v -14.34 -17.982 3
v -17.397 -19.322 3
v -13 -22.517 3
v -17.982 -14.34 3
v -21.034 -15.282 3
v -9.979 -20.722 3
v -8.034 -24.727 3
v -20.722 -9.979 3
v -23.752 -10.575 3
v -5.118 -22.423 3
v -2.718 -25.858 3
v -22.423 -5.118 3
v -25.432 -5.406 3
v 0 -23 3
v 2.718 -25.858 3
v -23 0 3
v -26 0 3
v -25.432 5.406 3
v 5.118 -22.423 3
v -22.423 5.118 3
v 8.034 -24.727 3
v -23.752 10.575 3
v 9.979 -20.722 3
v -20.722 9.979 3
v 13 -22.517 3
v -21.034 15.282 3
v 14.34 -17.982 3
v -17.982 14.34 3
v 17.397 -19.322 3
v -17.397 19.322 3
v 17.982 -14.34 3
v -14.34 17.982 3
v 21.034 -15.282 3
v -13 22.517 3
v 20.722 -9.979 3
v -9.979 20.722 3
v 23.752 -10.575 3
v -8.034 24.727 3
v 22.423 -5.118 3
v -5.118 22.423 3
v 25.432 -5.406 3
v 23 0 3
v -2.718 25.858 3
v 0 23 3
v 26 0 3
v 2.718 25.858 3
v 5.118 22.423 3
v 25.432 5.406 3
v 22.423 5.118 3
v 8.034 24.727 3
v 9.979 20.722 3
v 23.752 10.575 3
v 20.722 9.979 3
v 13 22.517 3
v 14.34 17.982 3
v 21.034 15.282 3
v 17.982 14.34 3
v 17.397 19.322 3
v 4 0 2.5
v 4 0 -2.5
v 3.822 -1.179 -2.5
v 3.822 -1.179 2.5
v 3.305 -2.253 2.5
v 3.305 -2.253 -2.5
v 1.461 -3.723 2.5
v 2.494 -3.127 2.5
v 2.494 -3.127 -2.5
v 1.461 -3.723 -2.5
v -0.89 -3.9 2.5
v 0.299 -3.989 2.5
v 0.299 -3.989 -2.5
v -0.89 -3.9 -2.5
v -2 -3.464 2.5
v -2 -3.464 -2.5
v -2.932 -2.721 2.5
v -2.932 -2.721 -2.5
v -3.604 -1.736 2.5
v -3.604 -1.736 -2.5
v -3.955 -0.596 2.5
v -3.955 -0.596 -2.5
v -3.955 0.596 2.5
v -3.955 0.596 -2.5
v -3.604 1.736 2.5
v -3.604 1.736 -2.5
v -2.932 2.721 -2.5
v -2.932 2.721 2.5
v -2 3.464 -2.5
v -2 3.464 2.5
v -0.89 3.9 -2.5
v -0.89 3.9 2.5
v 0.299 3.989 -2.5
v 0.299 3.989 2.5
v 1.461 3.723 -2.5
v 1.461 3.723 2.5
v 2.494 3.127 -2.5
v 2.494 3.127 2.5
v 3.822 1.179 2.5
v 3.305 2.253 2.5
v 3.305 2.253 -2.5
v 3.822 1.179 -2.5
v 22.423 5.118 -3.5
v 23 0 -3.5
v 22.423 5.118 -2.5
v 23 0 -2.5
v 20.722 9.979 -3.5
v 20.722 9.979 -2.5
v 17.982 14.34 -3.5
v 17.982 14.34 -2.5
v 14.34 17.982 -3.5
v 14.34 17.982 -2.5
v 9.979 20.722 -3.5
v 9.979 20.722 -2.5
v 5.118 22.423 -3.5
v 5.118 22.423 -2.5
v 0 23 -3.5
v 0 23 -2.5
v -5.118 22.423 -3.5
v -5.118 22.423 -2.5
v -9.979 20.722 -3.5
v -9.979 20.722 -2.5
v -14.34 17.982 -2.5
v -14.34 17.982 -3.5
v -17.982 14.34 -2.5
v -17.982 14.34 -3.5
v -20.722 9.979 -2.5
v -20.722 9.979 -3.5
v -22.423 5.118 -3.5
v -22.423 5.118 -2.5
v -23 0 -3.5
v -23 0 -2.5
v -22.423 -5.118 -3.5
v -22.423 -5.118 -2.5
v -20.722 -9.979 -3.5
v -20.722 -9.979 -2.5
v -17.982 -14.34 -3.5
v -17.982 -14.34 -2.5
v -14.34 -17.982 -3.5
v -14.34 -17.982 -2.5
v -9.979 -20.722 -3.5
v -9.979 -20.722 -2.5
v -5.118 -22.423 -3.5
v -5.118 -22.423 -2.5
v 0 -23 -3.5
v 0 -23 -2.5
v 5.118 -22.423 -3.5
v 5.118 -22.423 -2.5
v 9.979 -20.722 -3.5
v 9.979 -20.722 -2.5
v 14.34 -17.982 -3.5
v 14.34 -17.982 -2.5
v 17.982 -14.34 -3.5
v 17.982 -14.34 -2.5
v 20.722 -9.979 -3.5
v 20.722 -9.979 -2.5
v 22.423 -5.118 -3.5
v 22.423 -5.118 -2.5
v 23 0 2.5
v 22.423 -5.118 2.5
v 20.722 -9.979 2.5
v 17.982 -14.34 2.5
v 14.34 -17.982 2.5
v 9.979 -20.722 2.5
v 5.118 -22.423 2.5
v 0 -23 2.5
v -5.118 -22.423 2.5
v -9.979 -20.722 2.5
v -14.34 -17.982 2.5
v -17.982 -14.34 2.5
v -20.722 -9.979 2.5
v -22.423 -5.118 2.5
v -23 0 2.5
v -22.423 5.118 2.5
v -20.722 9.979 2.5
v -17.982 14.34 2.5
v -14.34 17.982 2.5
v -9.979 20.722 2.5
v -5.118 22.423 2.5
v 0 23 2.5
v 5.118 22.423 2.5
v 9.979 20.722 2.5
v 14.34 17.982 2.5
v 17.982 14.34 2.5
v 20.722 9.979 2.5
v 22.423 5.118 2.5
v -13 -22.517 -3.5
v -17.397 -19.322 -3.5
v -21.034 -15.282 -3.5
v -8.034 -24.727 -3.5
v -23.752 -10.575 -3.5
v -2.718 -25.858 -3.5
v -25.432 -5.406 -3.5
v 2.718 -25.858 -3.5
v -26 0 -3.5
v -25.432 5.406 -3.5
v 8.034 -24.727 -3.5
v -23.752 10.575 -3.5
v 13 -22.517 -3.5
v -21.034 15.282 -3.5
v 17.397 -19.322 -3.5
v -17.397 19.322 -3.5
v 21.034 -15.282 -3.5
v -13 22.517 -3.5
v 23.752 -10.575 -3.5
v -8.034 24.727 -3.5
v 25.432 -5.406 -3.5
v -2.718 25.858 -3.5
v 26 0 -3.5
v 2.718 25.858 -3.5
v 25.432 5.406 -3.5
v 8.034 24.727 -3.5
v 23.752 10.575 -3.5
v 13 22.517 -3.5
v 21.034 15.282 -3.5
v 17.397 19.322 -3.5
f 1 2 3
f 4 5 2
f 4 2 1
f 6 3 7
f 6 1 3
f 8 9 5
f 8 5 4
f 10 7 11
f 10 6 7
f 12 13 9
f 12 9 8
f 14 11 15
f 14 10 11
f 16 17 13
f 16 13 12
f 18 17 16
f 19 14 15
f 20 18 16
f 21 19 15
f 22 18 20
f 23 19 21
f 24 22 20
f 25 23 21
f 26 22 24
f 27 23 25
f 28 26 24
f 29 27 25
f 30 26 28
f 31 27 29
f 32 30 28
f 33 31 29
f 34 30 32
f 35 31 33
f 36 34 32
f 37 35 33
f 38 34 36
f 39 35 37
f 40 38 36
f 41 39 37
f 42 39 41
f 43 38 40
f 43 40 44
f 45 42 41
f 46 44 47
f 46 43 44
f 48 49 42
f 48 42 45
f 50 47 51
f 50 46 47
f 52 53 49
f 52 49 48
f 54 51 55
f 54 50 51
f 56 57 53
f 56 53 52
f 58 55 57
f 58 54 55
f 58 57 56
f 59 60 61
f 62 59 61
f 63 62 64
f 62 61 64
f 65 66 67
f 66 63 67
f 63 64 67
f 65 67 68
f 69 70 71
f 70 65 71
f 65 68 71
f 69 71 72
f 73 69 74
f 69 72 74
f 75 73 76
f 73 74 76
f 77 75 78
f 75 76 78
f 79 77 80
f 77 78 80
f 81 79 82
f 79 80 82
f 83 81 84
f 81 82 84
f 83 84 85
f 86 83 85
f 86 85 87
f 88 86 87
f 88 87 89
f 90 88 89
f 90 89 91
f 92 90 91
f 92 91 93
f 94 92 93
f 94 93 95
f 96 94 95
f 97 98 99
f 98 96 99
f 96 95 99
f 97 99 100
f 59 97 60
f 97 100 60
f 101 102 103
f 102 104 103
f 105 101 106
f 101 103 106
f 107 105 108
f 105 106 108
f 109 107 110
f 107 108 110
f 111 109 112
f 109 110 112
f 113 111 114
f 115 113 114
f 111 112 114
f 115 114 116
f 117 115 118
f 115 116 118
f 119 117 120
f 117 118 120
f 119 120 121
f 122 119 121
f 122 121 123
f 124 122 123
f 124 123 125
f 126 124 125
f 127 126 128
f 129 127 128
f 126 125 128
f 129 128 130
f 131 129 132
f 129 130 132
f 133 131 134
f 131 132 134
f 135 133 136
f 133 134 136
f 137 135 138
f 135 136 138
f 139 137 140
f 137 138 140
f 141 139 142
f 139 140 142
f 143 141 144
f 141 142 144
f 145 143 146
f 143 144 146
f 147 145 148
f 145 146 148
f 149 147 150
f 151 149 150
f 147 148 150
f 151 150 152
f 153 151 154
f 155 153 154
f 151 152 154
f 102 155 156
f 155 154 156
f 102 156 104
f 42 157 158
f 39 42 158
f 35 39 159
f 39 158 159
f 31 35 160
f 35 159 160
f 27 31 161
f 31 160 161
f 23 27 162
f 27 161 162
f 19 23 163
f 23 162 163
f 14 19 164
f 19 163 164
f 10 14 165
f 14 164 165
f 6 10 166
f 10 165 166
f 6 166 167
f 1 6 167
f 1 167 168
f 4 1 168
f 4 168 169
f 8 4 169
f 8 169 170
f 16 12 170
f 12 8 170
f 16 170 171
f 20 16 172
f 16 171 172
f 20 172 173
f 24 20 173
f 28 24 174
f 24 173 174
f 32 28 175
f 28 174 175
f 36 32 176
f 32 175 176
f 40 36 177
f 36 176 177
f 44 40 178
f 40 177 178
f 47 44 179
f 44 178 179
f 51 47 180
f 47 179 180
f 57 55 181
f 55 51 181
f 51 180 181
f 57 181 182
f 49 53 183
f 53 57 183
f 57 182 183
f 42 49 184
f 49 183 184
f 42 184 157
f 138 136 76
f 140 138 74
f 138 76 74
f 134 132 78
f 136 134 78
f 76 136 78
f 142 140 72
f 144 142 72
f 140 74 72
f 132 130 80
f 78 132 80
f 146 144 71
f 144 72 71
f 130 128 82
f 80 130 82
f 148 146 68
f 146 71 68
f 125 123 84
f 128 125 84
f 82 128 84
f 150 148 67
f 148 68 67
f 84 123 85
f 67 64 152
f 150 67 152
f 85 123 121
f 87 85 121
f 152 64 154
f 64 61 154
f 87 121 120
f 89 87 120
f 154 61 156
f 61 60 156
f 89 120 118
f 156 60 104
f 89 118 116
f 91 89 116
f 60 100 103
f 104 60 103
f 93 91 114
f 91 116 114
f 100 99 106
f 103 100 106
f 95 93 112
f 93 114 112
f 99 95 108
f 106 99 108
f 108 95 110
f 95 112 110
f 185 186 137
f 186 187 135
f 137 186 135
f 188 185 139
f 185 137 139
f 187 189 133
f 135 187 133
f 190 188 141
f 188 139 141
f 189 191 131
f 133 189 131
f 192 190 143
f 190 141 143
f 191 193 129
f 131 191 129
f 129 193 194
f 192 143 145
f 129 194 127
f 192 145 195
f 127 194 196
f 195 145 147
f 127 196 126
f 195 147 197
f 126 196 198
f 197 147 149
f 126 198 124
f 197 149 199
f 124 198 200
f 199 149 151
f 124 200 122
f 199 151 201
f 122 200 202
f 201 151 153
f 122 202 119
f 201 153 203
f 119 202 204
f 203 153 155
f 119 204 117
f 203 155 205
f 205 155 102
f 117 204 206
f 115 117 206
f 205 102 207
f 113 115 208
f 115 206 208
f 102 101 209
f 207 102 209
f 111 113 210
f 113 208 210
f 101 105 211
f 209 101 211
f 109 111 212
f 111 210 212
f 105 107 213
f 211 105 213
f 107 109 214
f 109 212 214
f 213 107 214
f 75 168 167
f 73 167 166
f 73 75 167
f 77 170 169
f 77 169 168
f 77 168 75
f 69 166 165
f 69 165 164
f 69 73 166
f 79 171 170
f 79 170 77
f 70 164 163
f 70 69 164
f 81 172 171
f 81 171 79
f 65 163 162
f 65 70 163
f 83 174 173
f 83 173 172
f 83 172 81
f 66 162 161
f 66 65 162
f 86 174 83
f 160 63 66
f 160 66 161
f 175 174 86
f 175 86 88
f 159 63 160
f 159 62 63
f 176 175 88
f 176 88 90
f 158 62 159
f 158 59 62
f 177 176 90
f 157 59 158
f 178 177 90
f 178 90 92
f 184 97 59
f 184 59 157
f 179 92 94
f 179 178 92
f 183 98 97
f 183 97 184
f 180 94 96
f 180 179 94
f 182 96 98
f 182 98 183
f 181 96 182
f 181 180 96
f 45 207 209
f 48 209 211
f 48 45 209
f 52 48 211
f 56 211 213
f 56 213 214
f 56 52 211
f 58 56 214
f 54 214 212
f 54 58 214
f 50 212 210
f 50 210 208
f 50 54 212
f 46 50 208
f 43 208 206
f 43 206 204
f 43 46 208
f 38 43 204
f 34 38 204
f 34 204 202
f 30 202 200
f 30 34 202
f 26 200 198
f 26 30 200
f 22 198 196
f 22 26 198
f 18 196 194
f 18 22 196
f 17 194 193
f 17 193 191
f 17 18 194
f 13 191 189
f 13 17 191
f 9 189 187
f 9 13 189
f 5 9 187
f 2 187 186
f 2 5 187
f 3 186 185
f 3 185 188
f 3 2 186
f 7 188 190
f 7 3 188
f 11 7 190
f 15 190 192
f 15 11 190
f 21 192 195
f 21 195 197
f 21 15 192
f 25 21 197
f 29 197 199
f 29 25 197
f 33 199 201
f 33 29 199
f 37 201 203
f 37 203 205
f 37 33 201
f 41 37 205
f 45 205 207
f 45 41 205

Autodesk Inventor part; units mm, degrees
ref_plane "YZ Plane" through (0, 0, 0) normal (1, 0, 0) x (0, 1, 0)
ref_plane "XZ Plane" through (0, 0, 0) normal (0, 1, 0) x (-1, 0, 0)
ref_plane "XY Plane" through (0, 0, 0) normal (0, 0, 1) x (1, 0, 0)
sketch "Sketch1" plane through (0, 0, 0) normal (0, 0, 1) x (1, 0, 0)
  circle A0 centre (0, 0) radius 23
  circle A1 centre (0, 0) radius 4
  dimension "d0" = 46
  dimension "d1" = 8
extrude "Extrusion1" add sketch "Sketch1" along normal mid plane 5
sketch "Sketch2" plane through (0, 0, 2.5) normal (0, 0, 1) x (1, 0, 0)
  circle A0 centre (0, 0) radius 23
  circle A1 centre (0, 0) radius 26
  dimension "d4" = 52
extrude "Extrusion2" add sketch "Sketch2" against normal blind 6 and the other way blind 0.5
properties part number "Rueda"
